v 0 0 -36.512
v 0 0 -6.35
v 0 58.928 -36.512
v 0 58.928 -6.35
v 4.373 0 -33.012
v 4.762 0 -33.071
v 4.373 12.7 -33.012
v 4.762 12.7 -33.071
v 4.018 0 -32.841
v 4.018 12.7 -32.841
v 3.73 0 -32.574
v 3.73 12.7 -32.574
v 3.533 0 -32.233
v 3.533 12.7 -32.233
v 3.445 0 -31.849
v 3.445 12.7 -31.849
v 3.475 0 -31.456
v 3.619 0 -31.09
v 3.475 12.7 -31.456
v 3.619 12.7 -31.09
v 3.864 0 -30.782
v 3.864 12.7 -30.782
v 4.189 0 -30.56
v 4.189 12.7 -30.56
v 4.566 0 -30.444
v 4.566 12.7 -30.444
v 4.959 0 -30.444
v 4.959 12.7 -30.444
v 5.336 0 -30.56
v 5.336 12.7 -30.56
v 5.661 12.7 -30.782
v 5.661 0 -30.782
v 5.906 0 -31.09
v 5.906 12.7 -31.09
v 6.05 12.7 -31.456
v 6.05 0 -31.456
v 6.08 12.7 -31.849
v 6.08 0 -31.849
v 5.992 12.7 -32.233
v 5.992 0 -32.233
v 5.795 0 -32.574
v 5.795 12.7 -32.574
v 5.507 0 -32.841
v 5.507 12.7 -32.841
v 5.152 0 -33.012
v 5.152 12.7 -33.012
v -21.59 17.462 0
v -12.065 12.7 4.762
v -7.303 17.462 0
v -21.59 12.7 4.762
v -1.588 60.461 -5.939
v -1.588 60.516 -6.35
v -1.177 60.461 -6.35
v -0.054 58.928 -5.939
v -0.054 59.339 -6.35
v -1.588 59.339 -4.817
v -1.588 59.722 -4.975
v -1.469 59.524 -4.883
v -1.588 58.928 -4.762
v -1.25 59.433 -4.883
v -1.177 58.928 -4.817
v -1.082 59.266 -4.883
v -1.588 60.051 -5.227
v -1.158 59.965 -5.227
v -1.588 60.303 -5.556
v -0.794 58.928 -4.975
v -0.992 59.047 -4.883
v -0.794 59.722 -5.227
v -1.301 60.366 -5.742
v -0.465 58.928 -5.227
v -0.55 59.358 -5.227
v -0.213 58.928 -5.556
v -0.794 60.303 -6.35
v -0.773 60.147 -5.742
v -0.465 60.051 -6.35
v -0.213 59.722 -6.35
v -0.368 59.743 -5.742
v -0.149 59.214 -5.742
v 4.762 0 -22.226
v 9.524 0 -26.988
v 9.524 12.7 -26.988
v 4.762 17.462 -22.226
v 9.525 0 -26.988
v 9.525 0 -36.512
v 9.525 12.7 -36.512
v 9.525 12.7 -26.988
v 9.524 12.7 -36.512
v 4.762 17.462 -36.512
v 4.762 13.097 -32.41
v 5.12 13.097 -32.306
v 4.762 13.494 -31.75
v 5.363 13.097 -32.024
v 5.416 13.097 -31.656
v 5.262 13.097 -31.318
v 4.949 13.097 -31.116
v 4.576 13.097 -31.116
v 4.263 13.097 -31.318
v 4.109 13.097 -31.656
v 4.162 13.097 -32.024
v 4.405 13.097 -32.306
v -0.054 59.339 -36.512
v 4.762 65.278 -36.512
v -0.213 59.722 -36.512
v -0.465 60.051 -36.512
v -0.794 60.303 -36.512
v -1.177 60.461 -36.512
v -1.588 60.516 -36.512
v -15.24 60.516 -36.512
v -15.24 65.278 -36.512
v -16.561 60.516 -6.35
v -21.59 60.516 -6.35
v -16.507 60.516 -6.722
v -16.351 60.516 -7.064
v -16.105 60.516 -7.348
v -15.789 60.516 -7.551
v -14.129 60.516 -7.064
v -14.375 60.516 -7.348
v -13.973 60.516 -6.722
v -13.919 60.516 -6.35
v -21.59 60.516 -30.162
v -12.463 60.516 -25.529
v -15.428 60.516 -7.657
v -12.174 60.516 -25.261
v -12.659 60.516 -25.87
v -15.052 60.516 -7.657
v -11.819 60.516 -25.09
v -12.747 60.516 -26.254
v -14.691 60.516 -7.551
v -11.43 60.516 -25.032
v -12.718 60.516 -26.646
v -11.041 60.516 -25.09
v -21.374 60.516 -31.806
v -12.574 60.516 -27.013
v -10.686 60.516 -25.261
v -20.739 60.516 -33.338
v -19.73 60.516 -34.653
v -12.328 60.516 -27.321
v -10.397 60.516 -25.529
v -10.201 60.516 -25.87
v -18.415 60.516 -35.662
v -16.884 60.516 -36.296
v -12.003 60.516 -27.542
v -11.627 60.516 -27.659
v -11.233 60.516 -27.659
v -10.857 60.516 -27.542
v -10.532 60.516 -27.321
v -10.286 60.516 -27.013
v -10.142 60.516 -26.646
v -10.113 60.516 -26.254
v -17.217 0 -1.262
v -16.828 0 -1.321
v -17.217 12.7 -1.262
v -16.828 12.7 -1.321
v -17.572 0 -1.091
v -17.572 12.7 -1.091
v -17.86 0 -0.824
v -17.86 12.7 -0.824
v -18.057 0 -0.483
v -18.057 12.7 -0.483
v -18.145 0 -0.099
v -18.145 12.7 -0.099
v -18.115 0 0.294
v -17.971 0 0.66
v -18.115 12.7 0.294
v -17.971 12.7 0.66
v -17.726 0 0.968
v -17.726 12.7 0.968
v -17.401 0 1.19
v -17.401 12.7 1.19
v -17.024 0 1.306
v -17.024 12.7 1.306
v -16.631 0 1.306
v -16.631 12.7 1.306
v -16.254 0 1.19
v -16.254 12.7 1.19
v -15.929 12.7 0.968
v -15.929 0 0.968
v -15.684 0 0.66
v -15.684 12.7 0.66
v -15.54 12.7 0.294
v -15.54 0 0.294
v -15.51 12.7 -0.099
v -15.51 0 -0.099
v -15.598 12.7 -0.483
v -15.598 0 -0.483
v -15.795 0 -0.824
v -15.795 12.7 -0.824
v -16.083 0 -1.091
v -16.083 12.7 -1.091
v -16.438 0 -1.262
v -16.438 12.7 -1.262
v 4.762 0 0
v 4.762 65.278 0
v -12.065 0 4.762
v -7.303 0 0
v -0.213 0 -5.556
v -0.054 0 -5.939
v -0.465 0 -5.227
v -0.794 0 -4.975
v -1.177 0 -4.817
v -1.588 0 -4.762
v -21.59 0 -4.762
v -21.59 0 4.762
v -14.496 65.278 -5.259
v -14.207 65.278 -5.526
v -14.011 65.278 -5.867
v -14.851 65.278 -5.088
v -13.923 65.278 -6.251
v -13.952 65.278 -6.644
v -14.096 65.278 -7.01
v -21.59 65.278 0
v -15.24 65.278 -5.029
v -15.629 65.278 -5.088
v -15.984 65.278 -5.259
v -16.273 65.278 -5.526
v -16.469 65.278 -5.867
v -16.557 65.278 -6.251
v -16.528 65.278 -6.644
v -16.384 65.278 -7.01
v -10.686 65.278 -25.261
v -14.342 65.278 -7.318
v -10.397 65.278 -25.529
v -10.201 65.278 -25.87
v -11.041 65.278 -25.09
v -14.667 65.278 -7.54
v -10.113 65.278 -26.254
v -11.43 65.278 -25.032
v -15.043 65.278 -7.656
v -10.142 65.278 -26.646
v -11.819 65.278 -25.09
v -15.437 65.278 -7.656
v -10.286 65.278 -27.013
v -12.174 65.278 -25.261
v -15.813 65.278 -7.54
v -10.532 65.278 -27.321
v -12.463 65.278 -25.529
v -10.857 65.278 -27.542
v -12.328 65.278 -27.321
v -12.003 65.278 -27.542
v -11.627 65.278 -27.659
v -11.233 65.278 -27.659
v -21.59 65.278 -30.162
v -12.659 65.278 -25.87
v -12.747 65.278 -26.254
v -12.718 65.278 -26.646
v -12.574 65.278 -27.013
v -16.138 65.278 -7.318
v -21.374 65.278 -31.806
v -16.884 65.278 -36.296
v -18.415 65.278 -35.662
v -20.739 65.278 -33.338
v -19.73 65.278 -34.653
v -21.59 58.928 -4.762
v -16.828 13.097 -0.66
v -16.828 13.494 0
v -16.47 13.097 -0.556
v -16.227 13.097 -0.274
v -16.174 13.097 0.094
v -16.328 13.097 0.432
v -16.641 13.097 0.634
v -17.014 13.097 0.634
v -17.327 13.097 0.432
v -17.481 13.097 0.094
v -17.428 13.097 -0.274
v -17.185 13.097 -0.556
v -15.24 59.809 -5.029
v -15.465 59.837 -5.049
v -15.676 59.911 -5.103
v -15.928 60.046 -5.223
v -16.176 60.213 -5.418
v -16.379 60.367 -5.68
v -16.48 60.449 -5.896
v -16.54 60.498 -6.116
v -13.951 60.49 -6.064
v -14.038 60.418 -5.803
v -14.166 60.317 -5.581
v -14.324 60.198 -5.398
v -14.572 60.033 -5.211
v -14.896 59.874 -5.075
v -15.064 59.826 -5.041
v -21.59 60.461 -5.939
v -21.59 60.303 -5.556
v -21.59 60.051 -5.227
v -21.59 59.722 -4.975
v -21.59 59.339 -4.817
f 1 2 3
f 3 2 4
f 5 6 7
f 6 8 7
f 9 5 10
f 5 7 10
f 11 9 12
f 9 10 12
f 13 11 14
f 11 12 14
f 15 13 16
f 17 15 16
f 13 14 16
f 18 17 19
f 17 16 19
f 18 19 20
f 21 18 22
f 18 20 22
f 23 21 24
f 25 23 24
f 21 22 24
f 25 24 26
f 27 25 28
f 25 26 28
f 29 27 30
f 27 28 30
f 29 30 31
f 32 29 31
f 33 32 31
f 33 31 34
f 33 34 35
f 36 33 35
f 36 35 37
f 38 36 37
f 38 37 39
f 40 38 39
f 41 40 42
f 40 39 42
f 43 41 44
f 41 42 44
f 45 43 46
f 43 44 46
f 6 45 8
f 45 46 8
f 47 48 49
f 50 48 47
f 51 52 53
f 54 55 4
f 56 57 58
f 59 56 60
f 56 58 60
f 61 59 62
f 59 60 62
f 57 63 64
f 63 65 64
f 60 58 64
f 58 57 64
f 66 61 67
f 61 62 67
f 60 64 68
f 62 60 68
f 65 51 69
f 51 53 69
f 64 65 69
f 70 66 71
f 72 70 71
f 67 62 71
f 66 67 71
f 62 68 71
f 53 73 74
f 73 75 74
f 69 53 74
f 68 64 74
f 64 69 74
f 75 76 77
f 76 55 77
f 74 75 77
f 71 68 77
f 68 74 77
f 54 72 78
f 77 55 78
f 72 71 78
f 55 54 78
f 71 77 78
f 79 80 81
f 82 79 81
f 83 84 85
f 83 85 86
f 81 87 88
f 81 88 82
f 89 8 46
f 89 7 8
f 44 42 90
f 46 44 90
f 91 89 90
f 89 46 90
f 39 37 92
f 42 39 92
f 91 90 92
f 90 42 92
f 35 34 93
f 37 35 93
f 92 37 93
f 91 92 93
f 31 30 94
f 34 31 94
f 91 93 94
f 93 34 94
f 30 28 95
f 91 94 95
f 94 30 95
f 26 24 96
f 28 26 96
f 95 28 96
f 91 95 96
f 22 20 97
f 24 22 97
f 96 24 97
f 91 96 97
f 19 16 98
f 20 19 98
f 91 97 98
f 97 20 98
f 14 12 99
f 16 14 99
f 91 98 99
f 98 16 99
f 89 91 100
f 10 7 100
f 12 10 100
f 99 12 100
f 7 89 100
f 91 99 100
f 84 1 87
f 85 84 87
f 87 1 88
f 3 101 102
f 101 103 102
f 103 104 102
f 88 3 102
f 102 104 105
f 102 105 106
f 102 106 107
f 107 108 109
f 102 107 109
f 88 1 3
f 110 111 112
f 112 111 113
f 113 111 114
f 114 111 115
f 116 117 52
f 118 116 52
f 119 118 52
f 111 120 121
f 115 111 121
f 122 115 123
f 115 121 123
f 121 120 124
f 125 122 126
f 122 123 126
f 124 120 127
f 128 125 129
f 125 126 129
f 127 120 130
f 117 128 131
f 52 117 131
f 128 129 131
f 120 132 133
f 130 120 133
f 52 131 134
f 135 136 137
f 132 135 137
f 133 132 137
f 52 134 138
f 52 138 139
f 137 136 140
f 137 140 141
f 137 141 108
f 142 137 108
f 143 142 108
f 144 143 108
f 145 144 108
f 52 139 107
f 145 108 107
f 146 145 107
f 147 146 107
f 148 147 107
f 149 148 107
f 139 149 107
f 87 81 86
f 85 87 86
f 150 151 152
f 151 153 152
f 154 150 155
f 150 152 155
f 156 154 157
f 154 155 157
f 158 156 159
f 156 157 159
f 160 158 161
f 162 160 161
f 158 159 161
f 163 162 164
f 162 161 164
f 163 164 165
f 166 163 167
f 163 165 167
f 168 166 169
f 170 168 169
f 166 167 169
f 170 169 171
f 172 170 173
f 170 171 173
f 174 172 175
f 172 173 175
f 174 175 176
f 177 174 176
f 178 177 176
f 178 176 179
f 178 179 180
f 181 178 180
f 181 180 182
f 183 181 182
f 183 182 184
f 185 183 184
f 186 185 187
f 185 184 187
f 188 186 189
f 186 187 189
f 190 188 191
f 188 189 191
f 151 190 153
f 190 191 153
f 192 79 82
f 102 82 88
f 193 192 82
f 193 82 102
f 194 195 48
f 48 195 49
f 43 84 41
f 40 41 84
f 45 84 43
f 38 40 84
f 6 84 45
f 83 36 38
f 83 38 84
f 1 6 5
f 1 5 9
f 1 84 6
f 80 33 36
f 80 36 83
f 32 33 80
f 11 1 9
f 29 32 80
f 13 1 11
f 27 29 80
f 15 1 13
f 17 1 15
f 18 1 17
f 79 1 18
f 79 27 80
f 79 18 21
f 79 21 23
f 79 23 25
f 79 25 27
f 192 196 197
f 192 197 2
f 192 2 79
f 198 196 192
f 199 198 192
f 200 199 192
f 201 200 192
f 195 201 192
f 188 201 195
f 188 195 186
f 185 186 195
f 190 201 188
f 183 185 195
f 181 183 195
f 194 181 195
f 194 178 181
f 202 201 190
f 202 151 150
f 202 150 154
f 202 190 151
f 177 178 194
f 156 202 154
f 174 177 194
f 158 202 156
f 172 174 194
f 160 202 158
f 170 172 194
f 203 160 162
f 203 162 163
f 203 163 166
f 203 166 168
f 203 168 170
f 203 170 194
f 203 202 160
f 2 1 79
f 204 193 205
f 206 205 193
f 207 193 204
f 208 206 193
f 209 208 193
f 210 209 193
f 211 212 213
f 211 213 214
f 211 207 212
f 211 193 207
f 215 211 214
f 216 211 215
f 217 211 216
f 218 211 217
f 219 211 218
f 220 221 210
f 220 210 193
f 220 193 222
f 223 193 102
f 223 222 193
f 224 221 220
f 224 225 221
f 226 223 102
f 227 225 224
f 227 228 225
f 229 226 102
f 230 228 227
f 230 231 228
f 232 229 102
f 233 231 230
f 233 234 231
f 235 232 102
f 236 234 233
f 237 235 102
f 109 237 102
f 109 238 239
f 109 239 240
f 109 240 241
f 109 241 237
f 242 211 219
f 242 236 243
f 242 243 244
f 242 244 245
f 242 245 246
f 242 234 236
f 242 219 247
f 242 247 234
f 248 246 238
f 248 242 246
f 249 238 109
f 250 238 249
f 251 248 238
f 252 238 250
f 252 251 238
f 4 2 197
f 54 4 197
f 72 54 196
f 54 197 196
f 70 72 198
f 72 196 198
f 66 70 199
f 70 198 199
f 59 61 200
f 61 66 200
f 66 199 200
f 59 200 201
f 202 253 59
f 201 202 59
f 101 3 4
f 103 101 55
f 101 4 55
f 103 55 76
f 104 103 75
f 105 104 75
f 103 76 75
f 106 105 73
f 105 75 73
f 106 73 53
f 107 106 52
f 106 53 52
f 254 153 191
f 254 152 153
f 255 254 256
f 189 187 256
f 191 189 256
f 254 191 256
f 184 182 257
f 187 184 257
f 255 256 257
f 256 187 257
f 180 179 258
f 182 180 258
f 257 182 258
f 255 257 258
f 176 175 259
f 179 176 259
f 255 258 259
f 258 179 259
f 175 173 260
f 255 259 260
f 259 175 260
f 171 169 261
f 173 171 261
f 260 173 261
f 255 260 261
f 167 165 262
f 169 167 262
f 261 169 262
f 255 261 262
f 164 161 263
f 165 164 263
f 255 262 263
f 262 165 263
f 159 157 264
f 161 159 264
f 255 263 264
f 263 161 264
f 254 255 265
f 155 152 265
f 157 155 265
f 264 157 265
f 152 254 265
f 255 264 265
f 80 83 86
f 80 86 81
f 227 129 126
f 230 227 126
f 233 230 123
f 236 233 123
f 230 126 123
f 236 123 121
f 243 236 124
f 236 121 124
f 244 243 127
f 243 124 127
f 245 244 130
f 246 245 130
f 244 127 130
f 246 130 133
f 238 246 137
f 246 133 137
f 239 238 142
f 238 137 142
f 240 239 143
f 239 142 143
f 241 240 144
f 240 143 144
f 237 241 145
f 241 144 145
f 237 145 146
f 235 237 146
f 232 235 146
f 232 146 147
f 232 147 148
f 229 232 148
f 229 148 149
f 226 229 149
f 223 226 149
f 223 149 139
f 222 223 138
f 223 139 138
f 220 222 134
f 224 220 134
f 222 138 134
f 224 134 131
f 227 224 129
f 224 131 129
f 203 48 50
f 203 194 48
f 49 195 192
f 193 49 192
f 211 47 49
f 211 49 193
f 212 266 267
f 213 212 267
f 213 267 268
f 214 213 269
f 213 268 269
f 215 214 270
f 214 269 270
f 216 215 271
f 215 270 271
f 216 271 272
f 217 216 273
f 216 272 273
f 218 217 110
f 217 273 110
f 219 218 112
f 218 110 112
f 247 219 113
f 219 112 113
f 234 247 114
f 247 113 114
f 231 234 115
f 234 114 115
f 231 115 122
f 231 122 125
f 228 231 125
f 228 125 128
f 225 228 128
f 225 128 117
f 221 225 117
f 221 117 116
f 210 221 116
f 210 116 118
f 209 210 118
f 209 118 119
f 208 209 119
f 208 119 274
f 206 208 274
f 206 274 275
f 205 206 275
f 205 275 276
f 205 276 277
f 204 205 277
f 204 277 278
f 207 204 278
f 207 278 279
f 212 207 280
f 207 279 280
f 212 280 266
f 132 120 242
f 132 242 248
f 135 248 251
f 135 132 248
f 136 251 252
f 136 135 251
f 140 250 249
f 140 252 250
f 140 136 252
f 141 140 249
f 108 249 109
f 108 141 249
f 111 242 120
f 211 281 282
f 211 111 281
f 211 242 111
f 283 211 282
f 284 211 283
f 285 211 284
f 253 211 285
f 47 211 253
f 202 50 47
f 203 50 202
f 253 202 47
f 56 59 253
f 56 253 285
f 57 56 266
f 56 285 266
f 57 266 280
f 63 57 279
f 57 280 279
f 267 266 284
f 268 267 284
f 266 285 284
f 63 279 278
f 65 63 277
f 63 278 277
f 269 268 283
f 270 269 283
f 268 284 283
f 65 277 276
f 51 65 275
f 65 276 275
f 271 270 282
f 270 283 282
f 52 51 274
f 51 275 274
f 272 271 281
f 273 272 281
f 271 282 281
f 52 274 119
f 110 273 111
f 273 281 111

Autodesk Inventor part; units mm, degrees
ref_plane "YZ Plane" through (0, 0, 0) normal (1, 0, 0) x (0, 1, 0)
ref_plane "XZ Plane" through (0, 0, 0) normal (0, 1, 0) x (-1, 0, 0)
ref_plane "XY Plane" through (0, 0, 0) normal (0, 0, 1) x (1, 0, 0)
sketch "Sketch1" plane through (0, 0, 0) normal (1, 0, 0) x (0, 1, 0)
  line L0 (0, 0) -> (65.278, 0)
  line L1 (65.278, 0) -> (65.278, -16.1544)
  line L2 (0, -16.1544) -> (0, 0)
  line L3 (0, 0) -> (0, -20.066)
  line L4 (65.278, 0) -> (0, 0)
  line L5 (0, 0) -> (0, -36.5125)
  line L6 (0, -36.5125) -> (65.278, -36.5125)
  line L7 (65.278, -36.5125) -> (65.278, 0)
  dimension "d0" = 65.278
  dimension "d1" = 16.1544
  dimension "d11" = 36.5125
extrude "Extrusion1" add sketch "Sketch1" along normal blind 4.7625
sketch "Sketch3" plane through (0, 0, 0) normal (0, 0, 1) x (1, 0, 0)
  line L0 (0, 65.278) -> (0, 0) projected
  line L1 (0, 0) -> (4.7625, 0) projected
  line L2 (4.7625, 65.278) -> (4.7625, 0) projected
  line L3 (0, 65.278) -> (4.7625, 65.278) projected
  line L4 (4.7625, 65.278) -> (4.7625, 0) projected
  line L5 (4.7625, 65.278) -> (-21.59, 65.278)
  line L6 (-21.59, 65.278) -> (-21.59, 0)
  line L7 (-21.59, 0) -> (4.7625, 0)
  line L8 (4.7625, 0) -> (4.7625, 65.278)
  dimension "d12" = 26.3525
extrude "Extrusion3" add sketch "Sketch3" against normal blind 4.7625 contours L0 L7 L6 L5
sketch "Sketch4" plane through (0, 65.278, -36.5125) normal (0, 1, 0) x (1, 0, 0)
  line L0 (0, 0) -> (0, -31.75) projected
  line L1 (-21.59, -31.75) -> (0, -31.75) projected
  line L2 (-21.59, -36.5125) -> (-21.59, -31.75) projected
  line L3 (4.7625, -36.5125) -> (-21.59, -36.5125) projected
  line L4 (4.7625, 0) -> (4.7625, -36.5125) projected
  line L5 (0, 0) -> (4.7625, 0) projected
  line L6 (-21.59, -31.75) -> (0, -31.75) projected
  line L7 (-21.59, -31.75) -> (-21.59, 0)
  line L8 (0, 0) -> (-21.59, 0)
  line L9 (-21.59, 0) -> (0, 0)
  line L10 (0, 0) -> (0, -31.75)
  line L11 (0, -31.75) -> (-21.59, -31.75)
  line L12 (-21.59, -31.75) -> (-21.59, 0)
  point P0 (0, -36.5125)
  dimension "d15" = 31.75
  dimension "d16" = 21.59
  dimension "d50" = 31.75
  dimension "d51" = 21.59
extrude "Extrusion4" add sketch "Sketch4" against normal blind 4.7625
fillet "Fillet1" radius 1.5875 3 edges at (0, 60.5155, -20.6375) (-10.795, 60.5155, -4.7625) (0, 30.2578, -4.7625)
sketch "Sketch6" plane through (0, 0, -36.5125) normal (0, -1, 0) x (1, 0, 0)
  line L0 (0, 30.1625) -> (0, 0) projected
  line L1 (0, 0) -> (4.7625, 0) projected
  line L2 (4.7625, 36.5125) -> (4.7625, 0) projected
  line L3 (-21.59, 36.5125) -> (4.7625, 36.5125) projected
  line L4 (-21.59, 36.5125) -> (-21.59, 31.75) projected
  line L5 (-1.5875, 31.75) -> (-21.59, 31.75) projected
  arc A0 (0, 30.1625) -> (-1.5875, 31.75) centre (-1.5875, 30.1625) ccw projected
  line L6 (0, 0) -> (9.525, 0)
  line L7 (9.525, 0) -> (9.525, 9.525)
  line L8 (9.525, 9.525) -> (0, 9.525)
  line L9 (0, 9.525) -> (0, 0)
  line L10 (-21.59, 36.5125) -> (-21.59, 31.75) projected
  line L11 (-21.59, 31.75) -> (-12.065, 31.75)
  line L12 (-12.065, 31.75) -> (-12.065, 41.275)
  line L13 (-12.065, 41.275) -> (-21.59, 41.275)
  line L14 (-21.59, 41.275) -> (-21.59, 31.75)
  point P0 (0, 36.5125)
  dimension "d24" = 9.525
  dimension "d25" = 9.525
  dimension "d26" = 9.525
  dimension "d27" = 9.525
extrude "Extrusion5" add sketch "Sketch6" against normal blind 12.7 contours L8 L2 L1 L0 | L8 L7 L6 L2 | L5 L4 L3 L12 | L3 L14 L13 L12
chamfer "Chamfer1" distance 4.7625 angle 45 4 edges at (4.7625, 6.35, -26.9875) (-12.065, 6.35, 0) (4.7625, 12.7, -31.75) (-16.8275, 12.7, 0)
sketch "Sketch8" plane through (-21.59, 0, -4.7625) normal (0, -1, 0) x (1, 0, 0)
  line L0 (20.0025, 0) -> (0, 0) projected
  arc A0 (21.59, -1.5875) -> (20.0025, 0) centre (20.0025, -1.5875) ccw projected
  line L1 (21.59, -1.5875) -> (21.59, -31.75) projected
  line L2 (21.59, -31.75) -> (31.115, -31.75) projected
  line L3 (31.115, -31.75) -> (31.115, -22.225) projected
  line L4 (26.3525, -17.4625) -> (31.115, -22.225) projected
  line L5 (26.3525, 4.7625) -> (26.3525, -17.4625) projected
  line L6 (14.2875, 4.7625) -> (26.3525, 4.7625) projected
  line L7 (9.525, 9.525) -> (14.2875, 4.7625) projected
  line L8 (9.525, 9.525) -> (0, 9.525) projected
  line L9 (0, 9.525) -> (0, 0) projected
  line L10 (26.3525, 4.7625) -> (0, 4.7625) projected
  point P0 (21.59, 4.7625)
  point P1 (4.7625, 4.7625)
  point P2 (26.3525, -26.9875)
hole "Hole1" at (-16.8275, 0, 0) at (4.7625, 0, -31.75) direction (0, 1, 0) diameter 2.6416 depth 12.7 tip angle 118 thread size "6-32 UNC" class "2B" standard "ANSI Unified Screw Threads"
sketch "Sketch9" plane through (4.7625, 65.278, 0) normal (0, 1, 0) x (1, 0, 0)
  line L0 (-26.3525, 36.5125) -> (0, 36.5125) projected
  line L1 (-26.3525, 0) -> (-26.3525, 36.5125) projected
  line L2 (0, 0) -> (-26.3525, 0) projected
  line L3 (0, 36.5125) -> (0, 0) projected
  point P0 (-4.7625, 0)
  point P1 (-20.0025, 6.35)
  point P2 (-16.1925, 26.3525)
  dimension "d52" = 6.35
  dimension "d56" = 10.16
  dimension "d57" = 6.35
  dimension "d58" = 10.16
hole "Hole2" at (-15.24, 65.278, -6.35) at (-11.43, 65.278, -26.3525) direction (0, -1, 0) diameter 2.6416 end through all thread size "6-32 UNC" class "2B" standard "ANSI Unified Screw Threads"
fillet "Fillet2" radius 6.35 1 edges at (-21.59, 62.8968, -36.5125)
equation "\"d15\" = d50"
equation "\"d16\" = d51"
properties part number "WheelIntakeBrace"
